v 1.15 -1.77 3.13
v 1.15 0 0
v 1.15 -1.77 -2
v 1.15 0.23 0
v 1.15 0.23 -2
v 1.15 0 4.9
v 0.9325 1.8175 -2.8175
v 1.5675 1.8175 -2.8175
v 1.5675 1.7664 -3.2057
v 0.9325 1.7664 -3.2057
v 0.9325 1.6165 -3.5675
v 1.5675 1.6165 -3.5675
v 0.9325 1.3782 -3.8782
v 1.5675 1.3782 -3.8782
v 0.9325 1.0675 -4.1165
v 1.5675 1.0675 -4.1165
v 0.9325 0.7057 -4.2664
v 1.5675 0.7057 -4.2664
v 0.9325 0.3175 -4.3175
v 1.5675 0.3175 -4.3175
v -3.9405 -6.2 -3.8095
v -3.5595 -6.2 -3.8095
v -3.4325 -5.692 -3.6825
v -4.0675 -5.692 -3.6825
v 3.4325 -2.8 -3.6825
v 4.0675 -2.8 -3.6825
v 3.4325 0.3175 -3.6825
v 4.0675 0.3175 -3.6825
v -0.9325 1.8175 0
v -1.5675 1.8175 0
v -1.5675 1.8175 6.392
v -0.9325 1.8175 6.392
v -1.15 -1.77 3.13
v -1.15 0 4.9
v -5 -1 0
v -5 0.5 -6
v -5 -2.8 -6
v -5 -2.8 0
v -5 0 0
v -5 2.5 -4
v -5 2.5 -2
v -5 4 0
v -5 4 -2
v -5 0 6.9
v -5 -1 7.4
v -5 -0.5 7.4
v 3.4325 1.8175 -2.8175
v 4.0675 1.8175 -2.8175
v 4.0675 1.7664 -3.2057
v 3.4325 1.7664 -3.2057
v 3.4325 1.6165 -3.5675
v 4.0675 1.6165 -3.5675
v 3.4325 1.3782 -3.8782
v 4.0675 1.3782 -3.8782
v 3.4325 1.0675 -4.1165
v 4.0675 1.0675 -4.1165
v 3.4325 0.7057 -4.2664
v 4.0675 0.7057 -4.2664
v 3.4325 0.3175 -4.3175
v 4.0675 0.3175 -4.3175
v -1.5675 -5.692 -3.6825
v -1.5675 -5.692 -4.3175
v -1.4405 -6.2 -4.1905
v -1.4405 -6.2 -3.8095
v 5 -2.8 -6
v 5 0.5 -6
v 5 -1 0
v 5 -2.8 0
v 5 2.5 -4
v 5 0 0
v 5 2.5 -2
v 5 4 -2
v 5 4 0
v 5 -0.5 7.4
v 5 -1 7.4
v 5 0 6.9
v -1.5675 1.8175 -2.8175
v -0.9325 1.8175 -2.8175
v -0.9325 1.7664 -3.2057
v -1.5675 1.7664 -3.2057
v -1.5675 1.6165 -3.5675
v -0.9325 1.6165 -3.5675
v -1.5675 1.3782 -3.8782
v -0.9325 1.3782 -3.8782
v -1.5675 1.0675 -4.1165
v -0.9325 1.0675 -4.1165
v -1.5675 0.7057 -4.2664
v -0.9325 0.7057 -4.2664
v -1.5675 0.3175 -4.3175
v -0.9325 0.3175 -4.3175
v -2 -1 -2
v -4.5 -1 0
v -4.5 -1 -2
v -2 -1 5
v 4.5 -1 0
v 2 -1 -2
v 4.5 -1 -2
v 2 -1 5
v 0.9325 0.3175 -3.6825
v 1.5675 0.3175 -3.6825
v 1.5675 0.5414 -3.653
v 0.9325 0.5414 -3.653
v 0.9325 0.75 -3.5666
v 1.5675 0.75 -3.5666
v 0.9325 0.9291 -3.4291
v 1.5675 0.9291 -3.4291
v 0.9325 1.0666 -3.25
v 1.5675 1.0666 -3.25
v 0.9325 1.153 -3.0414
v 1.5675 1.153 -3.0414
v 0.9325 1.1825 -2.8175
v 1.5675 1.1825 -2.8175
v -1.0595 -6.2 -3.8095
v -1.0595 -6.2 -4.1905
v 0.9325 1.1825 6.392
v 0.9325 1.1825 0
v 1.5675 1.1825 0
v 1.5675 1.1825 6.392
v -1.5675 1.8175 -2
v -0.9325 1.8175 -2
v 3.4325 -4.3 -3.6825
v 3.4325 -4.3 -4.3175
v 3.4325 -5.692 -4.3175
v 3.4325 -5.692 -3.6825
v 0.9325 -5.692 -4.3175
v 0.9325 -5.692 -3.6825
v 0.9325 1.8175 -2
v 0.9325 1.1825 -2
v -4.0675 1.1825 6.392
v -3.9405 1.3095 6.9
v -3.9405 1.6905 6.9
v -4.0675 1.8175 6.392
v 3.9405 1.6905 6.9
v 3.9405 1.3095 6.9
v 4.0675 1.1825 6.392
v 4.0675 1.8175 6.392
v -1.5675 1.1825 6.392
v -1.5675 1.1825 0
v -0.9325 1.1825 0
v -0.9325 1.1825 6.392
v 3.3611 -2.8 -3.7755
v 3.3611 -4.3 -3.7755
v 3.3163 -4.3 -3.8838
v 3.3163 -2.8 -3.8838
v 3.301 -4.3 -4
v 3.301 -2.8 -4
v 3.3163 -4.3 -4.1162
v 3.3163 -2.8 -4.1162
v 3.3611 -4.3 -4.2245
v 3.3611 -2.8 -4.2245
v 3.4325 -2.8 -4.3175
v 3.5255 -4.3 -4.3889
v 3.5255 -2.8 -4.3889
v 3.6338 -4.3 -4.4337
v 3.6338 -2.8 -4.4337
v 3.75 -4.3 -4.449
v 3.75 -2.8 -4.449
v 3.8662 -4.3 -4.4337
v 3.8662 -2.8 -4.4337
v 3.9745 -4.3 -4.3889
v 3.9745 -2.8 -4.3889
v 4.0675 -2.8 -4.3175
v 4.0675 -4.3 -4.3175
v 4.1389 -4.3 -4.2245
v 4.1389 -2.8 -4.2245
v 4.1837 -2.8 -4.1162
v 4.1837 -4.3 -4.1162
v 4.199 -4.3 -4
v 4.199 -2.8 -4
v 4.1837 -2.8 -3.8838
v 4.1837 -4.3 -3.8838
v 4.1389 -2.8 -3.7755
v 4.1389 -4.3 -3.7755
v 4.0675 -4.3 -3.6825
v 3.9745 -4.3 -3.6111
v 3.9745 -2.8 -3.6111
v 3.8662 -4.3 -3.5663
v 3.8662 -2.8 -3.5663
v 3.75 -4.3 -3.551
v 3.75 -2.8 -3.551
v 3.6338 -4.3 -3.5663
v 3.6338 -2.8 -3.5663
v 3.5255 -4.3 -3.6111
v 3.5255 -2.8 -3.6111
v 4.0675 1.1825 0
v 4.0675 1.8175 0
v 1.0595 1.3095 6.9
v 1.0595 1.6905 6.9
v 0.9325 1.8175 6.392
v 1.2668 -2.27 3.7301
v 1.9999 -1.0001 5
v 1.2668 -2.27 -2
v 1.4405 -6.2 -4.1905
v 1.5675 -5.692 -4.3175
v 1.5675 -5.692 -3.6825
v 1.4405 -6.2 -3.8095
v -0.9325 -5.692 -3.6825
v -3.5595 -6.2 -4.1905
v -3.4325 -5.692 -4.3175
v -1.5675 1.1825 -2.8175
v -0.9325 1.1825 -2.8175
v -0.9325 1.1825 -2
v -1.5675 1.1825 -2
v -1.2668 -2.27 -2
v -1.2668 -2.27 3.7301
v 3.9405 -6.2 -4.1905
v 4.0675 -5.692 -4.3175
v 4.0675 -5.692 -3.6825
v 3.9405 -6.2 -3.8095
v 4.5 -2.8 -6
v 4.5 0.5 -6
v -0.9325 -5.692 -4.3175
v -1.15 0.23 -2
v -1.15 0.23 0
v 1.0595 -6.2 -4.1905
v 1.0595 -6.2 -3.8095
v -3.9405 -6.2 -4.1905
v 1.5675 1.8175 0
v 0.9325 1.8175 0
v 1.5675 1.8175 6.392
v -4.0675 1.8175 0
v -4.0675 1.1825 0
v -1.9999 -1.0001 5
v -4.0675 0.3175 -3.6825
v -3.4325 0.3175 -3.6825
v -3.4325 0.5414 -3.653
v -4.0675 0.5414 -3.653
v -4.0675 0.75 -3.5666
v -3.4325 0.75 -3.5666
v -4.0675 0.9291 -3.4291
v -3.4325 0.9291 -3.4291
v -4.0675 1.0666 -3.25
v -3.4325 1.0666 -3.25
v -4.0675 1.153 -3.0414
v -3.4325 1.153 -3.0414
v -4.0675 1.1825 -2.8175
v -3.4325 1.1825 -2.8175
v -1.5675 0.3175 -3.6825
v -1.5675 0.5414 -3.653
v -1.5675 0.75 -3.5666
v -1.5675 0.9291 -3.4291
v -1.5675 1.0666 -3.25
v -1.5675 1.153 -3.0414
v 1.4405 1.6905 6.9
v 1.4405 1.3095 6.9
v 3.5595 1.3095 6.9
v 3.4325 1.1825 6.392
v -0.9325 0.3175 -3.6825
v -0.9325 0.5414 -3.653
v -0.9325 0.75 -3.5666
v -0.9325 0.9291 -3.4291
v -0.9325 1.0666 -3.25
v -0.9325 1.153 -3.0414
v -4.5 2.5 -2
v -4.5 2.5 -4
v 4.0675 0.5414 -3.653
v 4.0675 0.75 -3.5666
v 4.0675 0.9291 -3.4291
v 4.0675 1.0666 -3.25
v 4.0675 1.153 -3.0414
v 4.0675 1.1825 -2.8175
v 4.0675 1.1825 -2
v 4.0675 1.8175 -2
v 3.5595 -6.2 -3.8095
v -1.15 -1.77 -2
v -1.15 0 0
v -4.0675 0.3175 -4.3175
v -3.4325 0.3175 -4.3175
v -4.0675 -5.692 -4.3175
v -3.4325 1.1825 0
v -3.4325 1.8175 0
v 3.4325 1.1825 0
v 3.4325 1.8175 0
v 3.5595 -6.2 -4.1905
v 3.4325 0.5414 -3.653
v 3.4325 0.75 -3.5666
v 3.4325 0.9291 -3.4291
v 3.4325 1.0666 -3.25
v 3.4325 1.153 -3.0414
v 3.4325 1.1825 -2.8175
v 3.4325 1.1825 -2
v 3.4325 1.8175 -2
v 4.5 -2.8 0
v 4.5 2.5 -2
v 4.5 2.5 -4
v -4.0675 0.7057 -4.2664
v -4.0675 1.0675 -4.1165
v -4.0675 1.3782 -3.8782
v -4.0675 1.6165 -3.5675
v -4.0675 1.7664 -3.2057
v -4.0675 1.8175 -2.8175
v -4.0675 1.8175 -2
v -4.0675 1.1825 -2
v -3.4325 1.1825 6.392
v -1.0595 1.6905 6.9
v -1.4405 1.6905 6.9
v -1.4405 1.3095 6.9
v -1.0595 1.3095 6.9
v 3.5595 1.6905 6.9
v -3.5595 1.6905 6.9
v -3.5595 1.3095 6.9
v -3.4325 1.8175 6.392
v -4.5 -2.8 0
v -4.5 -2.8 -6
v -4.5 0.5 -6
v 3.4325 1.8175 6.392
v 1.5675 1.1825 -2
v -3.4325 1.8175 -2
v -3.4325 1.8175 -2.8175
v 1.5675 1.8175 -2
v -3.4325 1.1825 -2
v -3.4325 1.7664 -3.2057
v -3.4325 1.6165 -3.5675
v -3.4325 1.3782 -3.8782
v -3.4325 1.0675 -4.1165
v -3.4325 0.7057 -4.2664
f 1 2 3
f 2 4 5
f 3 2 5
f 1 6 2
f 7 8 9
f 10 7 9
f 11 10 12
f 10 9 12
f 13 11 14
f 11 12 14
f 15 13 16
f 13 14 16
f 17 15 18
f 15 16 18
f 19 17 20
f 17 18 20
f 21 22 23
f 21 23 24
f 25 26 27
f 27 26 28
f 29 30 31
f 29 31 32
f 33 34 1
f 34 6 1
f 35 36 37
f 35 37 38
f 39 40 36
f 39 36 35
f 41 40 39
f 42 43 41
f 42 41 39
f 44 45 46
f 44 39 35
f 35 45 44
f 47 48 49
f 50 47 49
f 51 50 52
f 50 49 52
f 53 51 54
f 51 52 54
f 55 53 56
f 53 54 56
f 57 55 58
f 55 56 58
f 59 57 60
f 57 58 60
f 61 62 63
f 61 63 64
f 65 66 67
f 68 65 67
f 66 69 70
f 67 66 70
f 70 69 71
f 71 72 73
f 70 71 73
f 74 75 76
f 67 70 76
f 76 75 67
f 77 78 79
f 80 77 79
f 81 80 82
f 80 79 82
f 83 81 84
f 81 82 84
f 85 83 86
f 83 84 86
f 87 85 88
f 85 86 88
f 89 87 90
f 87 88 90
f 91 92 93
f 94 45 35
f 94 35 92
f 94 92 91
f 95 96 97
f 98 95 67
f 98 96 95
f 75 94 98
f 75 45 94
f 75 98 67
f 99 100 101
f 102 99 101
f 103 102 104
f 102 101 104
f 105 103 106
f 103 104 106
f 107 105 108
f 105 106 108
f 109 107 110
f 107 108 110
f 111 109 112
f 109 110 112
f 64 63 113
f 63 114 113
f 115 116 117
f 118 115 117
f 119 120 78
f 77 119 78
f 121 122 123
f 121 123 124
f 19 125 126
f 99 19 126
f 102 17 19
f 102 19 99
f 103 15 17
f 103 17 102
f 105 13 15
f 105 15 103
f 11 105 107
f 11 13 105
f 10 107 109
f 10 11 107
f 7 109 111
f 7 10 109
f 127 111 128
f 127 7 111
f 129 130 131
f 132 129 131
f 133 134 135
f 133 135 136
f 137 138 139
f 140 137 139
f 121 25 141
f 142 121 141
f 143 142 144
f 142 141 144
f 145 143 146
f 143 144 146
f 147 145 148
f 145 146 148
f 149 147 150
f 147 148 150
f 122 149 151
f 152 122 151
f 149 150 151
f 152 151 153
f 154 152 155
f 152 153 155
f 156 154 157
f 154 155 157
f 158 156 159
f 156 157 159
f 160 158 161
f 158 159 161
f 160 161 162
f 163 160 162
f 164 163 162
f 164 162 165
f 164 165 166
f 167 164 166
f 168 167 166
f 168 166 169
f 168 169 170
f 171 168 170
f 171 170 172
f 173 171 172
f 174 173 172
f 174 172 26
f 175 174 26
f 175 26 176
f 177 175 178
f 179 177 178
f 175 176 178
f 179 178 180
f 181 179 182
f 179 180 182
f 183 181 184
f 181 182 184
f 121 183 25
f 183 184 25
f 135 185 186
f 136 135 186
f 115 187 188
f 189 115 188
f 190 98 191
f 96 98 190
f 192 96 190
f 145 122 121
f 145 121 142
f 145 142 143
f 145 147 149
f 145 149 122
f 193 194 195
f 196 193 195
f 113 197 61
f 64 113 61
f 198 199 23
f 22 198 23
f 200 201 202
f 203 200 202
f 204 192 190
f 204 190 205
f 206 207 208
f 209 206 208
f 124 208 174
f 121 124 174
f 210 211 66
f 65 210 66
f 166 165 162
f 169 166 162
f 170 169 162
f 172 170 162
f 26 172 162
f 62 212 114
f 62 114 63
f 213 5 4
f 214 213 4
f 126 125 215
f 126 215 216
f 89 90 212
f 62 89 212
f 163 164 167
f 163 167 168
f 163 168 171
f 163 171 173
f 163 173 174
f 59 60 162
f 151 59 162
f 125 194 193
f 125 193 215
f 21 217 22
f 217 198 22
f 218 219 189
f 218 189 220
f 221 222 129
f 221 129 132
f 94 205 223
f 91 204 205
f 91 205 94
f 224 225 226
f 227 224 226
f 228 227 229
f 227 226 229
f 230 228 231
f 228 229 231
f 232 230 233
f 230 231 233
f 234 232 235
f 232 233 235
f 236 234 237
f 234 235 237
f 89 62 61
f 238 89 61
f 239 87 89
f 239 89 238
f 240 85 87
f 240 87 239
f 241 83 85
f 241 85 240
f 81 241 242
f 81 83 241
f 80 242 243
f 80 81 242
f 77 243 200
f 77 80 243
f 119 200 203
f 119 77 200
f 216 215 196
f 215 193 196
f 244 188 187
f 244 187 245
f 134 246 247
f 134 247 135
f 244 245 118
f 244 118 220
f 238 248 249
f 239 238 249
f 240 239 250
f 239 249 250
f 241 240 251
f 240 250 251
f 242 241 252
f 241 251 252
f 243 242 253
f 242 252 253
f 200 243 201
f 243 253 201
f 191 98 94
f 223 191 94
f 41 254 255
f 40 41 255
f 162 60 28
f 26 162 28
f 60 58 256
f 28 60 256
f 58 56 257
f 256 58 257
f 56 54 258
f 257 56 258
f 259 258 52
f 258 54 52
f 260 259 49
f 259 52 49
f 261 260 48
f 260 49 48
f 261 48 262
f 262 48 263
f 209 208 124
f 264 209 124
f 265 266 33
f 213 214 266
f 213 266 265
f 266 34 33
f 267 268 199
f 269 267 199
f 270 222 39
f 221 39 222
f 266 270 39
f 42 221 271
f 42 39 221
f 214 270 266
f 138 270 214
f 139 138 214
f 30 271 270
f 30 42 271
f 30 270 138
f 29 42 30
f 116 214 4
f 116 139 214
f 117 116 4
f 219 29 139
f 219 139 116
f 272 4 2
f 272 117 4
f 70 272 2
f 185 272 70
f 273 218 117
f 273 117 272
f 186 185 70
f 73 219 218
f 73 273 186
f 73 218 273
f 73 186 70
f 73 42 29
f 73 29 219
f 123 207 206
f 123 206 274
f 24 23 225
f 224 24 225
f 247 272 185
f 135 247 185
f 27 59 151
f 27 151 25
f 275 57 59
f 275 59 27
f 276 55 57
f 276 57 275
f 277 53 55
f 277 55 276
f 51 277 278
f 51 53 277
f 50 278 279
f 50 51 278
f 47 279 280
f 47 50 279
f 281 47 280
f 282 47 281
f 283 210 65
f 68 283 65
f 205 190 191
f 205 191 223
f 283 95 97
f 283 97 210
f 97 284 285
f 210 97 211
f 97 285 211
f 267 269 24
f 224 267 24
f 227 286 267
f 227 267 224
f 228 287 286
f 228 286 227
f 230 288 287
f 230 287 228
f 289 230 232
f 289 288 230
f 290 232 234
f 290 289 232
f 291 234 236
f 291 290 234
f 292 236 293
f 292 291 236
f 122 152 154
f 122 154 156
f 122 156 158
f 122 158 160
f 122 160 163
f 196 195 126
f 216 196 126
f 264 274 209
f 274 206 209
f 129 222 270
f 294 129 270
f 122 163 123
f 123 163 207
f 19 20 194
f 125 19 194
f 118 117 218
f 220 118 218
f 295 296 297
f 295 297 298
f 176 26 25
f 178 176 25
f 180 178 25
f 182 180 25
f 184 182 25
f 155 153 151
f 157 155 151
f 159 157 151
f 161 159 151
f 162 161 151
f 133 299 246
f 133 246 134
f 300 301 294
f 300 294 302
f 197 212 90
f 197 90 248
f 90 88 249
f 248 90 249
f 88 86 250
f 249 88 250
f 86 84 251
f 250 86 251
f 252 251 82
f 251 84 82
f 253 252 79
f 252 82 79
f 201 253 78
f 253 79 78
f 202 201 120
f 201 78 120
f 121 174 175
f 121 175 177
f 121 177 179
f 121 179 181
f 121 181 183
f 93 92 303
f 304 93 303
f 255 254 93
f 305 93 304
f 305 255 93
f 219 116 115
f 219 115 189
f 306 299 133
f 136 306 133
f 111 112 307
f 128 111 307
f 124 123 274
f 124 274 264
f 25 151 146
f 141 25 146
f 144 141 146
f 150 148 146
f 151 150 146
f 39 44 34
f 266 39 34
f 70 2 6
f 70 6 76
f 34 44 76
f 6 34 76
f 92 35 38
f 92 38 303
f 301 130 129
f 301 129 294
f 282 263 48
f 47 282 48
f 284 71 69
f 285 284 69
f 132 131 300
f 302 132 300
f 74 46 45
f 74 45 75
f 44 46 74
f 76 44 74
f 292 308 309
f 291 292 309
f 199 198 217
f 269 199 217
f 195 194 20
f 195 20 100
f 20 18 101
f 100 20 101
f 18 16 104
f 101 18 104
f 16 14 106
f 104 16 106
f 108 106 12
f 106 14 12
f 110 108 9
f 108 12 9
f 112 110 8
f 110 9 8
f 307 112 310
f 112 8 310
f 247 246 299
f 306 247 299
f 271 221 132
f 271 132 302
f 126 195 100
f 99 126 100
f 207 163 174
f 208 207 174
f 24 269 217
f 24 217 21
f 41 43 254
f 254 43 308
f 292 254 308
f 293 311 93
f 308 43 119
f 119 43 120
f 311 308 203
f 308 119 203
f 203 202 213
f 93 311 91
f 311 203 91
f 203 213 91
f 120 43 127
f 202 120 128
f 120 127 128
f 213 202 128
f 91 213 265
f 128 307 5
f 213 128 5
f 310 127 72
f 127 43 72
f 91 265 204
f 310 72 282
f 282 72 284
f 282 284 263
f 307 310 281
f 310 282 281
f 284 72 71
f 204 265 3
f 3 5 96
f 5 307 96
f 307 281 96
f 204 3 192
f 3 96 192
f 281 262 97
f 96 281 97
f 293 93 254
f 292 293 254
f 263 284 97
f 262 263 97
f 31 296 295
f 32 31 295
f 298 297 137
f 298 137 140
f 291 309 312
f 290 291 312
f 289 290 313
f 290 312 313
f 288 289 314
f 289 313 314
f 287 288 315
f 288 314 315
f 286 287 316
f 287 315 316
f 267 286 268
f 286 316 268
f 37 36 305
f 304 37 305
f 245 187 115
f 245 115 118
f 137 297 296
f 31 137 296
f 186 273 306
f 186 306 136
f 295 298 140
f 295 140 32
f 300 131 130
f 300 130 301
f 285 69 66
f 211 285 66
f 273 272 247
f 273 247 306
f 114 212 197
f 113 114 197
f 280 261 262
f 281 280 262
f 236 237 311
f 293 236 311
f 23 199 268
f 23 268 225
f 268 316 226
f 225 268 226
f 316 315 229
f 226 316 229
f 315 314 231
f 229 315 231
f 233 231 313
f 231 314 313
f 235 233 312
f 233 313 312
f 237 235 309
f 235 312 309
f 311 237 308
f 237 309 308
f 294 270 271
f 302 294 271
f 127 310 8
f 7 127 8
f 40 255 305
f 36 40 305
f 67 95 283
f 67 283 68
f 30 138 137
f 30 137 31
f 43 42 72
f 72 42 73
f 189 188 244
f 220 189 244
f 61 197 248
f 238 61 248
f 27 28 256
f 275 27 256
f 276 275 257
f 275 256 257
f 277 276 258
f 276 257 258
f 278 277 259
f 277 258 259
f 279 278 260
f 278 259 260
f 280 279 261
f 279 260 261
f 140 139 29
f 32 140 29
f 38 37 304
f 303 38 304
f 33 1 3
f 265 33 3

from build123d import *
from OCP.BRepFilletAPI import BRepFilletAPI_MakeChamfer

# Parameters (mm, degrees)
SKETCH1_W                             = 10
SKETCH1_H                             = 4
BODY_BASE_DEPTH                       = 2
SKETCH2_W                             = 0.635
SKETCH2_H                             = 0.635
HORIZONTAL_PINS_DEPTH                 = 6.9
SKETCH3_W                             = 10
SKETCH3_H                             = 9.4
BODY_HORIZONTAL_SHELF_DEPTH           = 1
MATING_CONNECTOR_LEAD_IN_CHAMFER_SIZE = 0.5
SKETCH4_W                             = 0.5
SKETCH4_H                             = 6
BODY_SIDEWALLS_DEPTH                  = 6.8
BODY_SIDEWALL_MATERIA_REMOVALL_DEPTH  = 7.21
LOCKING_TROUGH_EXTERIOR_DEPTH         = 7
LOCKING_TROUGH_CHAMFER_EXTERIOR_SIZE  = 1.27
LOCKING_TROUGH_MATERIAL_REMOVAL_DEPTH = 1.15
REMAINDER_OF_PIN_DEPTH                = 0.635
LPATTERN_COMPLEMENT_OF_PINS_COUNT     = 4
LPATTERN_COMPLEMENT_OF_PINS_PITCH     = 2.5
PIN_CHAMFER1_SIZE                     = 0.508
PIN_CHAMFER1_SIZE2                    = 0.127
PIN_CHAMFER2_SIZE                     = 0.127
PIN_CHAMFER2_SIZE2                    = 0.508
SKETCH11_R                            = 0.449012806
PIN_1_MARKING_AND_MATE_AIDE_DEPTH     = 1.5


with BuildPart() as part:
    # Sketch1 → Body base (new body)
    with BuildSketch(Plane.XY):
        with Locations((0, 2)):
            Rectangle(SKETCH1_W, SKETCH1_H)
    extrude(amount=-BODY_BASE_DEPTH)

    # Sketch2 → Horizontal pins (add)
    with BuildSketch(Plane.XY):
        with Locations((-3.75, 1.5)):
            Rectangle(SKETCH2_W, SKETCH2_H)
        with Locations((-1.25, 1.5)):
            Rectangle(SKETCH2_W, SKETCH2_H)
        with Locations((1.25, 1.5)):
            Rectangle(SKETCH2_W, SKETCH2_H)
        with Locations((3.75, 1.5)):
            Rectangle(SKETCH2_W, SKETCH2_H)
    extrude(amount=HORIZONTAL_PINS_DEPTH)

    # Sketch3 → Body - horizontal shelf (add)
    with BuildSketch(Plane.XZ):
        with Locations((0, 2.7)):
            Rectangle(SKETCH3_W, SKETCH3_H)
    extrude(amount=BODY_HORIZONTAL_SHELF_DEPTH)

    # Mating connector lead-in chamfer
    mating_connector_lead_in_chamfer_edges = [part.edges().sort_by_distance(p)[0] for p in [
        (0, 0, 7.4),
    ]]
    chamfer(mating_connector_lead_in_chamfer_edges, length=MATING_CONNECTOR_LEAD_IN_CHAMFER_SIZE)

    # Sketch4 → Body sidewalls (add)
    with BuildSketch(Plane(origin=(0, 4, 0), x_dir=(1, 0, 0), z_dir=(0, 1, 0))):
        with Locations((-4.75, 3)):
            Rectangle(SKETCH4_W, SKETCH4_H)
        with Locations((4.75, 3)):
            Rectangle(SKETCH4_W, SKETCH4_H)
    extrude(amount=-BODY_SIDEWALLS_DEPTH)

    # Sketch5 → Body sidewall - materia removall (cut, symmetric)
    with BuildSketch(Plane(origin=(0, 0, 0), x_dir=(0, 0, -1), z_dir=(1, 0, 0))):
        Polygon((2, 4), (2, 2.5), (4, 2.5), (6, 0.5), (6, 4), align=None)
    extrude(amount=BODY_SIDEWALL_MATERIA_REMOVALL_DEPTH, both=True, mode=Mode.SUBTRACT)

    # Sketch6 → Locking trough - exterior (add)
    with BuildSketch(Plane(origin=(0, 0, -2), x_dir=(-1, 0, 0), z_dir=(0, 0, -1))):
        Polygon((-2, -1), (-1.266765158, -2.27), (1.266765158, -2.27), (2, -1), align=None)
    extrude(amount=-LOCKING_TROUGH_EXTERIOR_DEPTH)

    # Locking trough chamfer - exterior
    locking_trough_chamfer_exterior_edges = [part.edges().sort_by_distance(p)[0] for p in [
        (0, -2.27, 5),
    ]]
    chamfer(locking_trough_chamfer_exterior_edges, length=LOCKING_TROUGH_CHAMFER_EXTERIOR_SIZE - 0.0001)  # a hair under: the kernel refuses the full size

    # Sketch8 → Locking trough - material removal (cut, symmetric)
    with BuildSketch(Plane(origin=(0, 0, 0), x_dir=(0, 0, -1), z_dir=(1, 0, 0))):
        Polygon((-4.9, 0), (-3.13, -1.77), (6, -1.77), (6, 0.23), (0, 0.23), (0, 0), align=None)
    extrude(amount=LOCKING_TROUGH_MATERIAL_REMOVAL_DEPTH, both=True, mode=Mode.SUBTRACT)

    # Sketch9 → Remainder of pin (add)
    with BuildSketch(Plane(origin=(4.0675, 0, 0), x_dir=(0, 0, -1), z_dir=(1, 0, 0))):
        with BuildLine():
            Line((2, 1.8175), (2.8175, 1.8175))
            ThreePointArc((2.8175, 1.8175), (3.878160172, 1.378160172), (4.3175, 0.3175))
            Line((4.3175, 0.3175), (4.3175, -6.2))
            Line((4.3175, -6.2), (3.6825, -6.2))
            Line((3.6825, -6.2), (3.6825, 0.3175))
            ThreePointArc((3.6825, 0.3175), (3.429147366, 0.929147366), (2.8175, 1.1825))
            Line((2.8175, 1.1825), (2, 1.1825))
            Line((2, 1.1825), (2, 1.8175))
        make_face()
    remainder_of_pin = extrude(amount=-REMAINDER_OF_PIN_DEPTH)

    # LPattern - complement  of pins: Remainder of pin ×4
    with Locations(*[(-i * LPATTERN_COMPLEMENT_OF_PINS_PITCH, 0, 0) for i in range(1, LPATTERN_COMPLEMENT_OF_PINS_COUNT)]):
        add(remainder_of_pin)

    # Pin chamfer1: one chamfer whose edges measure the first distance from different faces: ONE call of the kernel's chamfer builder (chamfer() names one face for all edges)
    pin_chamfer1_edges_1 = [part.edges().sort_by_distance(p)[0] for p in [
        (-4.0675, 1.5, 6.9),
    ]]
    pin_chamfer1_side_1 = [part.faces().sort_by_distance(p)[0] for p in [
        (-4.0675, 1.5, 3.45),
    ]]
    pin_chamfer1_edges_2 = [part.edges().sort_by_distance(p)[0] for p in [
        (-3.75, 1.1825, 6.9),
    ]]
    pin_chamfer1_side_2 = [part.faces().sort_by_distance(p)[0] for p in [
        (-3.75, 1.1825, 3.45),
    ]]
    pin_chamfer1_edges_3 = [part.edges().sort_by_distance(p)[0] for p in [
        (-3.4325, 1.5, 6.9),
    ]]
    pin_chamfer1_side_3 = [part.faces().sort_by_distance(p)[0] for p in [
        (-3.4325, 1.5, 3.45),
    ]]
    pin_chamfer1_edges_4 = [part.edges().sort_by_distance(p)[0] for p in [
        (-3.75, 1.8175, 6.9),
    ]]
    pin_chamfer1_side_4 = [part.faces().sort_by_distance(p)[0] for p in [
        (-3.75, 1.8175, 3.45),
    ]]
    pin_chamfer1_edges_5 = [part.edges().sort_by_distance(p)[0] for p in [
        (-1.5675, 1.5, 6.9),
    ]]
    pin_chamfer1_side_5 = [part.faces().sort_by_distance(p)[0] for p in [
        (-1.5675, 1.5, 3.45),
    ]]
    pin_chamfer1_edges_6 = [part.edges().sort_by_distance(p)[0] for p in [
        (-1.25, 1.1825, 6.9),
    ]]
    pin_chamfer1_side_6 = [part.faces().sort_by_distance(p)[0] for p in [
        (-1.25, 1.1825, 3.45),
    ]]
    pin_chamfer1_edges_7 = [part.edges().sort_by_distance(p)[0] for p in [
        (-0.9325, 1.5, 6.9),
    ]]
    pin_chamfer1_side_7 = [part.faces().sort_by_distance(p)[0] for p in [
        (-0.9325, 1.5, 3.45),
    ]]
    pin_chamfer1_edges_8 = [part.edges().sort_by_distance(p)[0] for p in [
        (-1.25, 1.8175, 6.9),
    ]]
    pin_chamfer1_side_8 = [part.faces().sort_by_distance(p)[0] for p in [
        (-1.25, 1.8175, 3.45),
    ]]
    pin_chamfer1_edges_9 = [part.edges().sort_by_distance(p)[0] for p in [
        (0.9325, 1.5, 6.9),
    ]]
    pin_chamfer1_side_9 = [part.faces().sort_by_distance(p)[0] for p in [
        (0.9325, 1.5, 3.45),
    ]]
    pin_chamfer1_edges_10 = [part.edges().sort_by_distance(p)[0] for p in [
        (1.25, 1.1825, 6.9),
    ]]
    pin_chamfer1_side_10 = [part.faces().sort_by_distance(p)[0] for p in [
        (1.25, 1.1825, 3.45),
    ]]
    pin_chamfer1_edges_11 = [part.edges().sort_by_distance(p)[0] for p in [
        (1.5675, 1.5, 6.9),
    ]]
    pin_chamfer1_side_11 = [part.faces().sort_by_distance(p)[0] for p in [
        (1.5675, 1.5, 3.45),
    ]]
    pin_chamfer1_edges_12 = [part.edges().sort_by_distance(p)[0] for p in [
        (1.25, 1.8175, 6.9),
    ]]
    pin_chamfer1_side_12 = [part.faces().sort_by_distance(p)[0] for p in [
        (1.25, 1.8175, 3.45),
    ]]
    pin_chamfer1_edges_13 = [part.edges().sort_by_distance(p)[0] for p in [
        (3.4325, 1.5, 6.9),
    ]]
    pin_chamfer1_side_13 = [part.faces().sort_by_distance(p)[0] for p in [
        (3.4325, 1.5, 3.45),
    ]]
    pin_chamfer1_edges_14 = [part.edges().sort_by_distance(p)[0] for p in [
        (3.75, 1.1825, 6.9),
    ]]
    pin_chamfer1_side_14 = [part.faces().sort_by_distance(p)[0] for p in [
        (3.75, 1.1825, 3.45),
    ]]
    pin_chamfer1_edges_15 = [part.edges().sort_by_distance(p)[0] for p in [
        (4.0675, 1.5, 6.9),
    ]]
    pin_chamfer1_side_15 = [part.faces().sort_by_distance(p)[0] for p in [
        (4.0675, 1.5, 3.45),
    ]]
    pin_chamfer1_edges_16 = [part.edges().sort_by_distance(p)[0] for p in [
        (3.75, 1.8175, 6.9),
    ]]
    pin_chamfer1_side_16 = [part.faces().sort_by_distance(p)[0] for p in [
        (3.75, 1.8175, 3.45),
    ]]
    pin_chamfer1 = BRepFilletAPI_MakeChamfer(part.part.solid().wrapped)
    for e in pin_chamfer1_edges_1:
        pin_chamfer1.Add(PIN_CHAMFER1_SIZE, PIN_CHAMFER1_SIZE2, e.wrapped, pin_chamfer1_side_1[0].wrapped)  # the first distance lies on this face
    for e in pin_chamfer1_edges_2:
        pin_chamfer1.Add(PIN_CHAMFER1_SIZE, PIN_CHAMFER1_SIZE2, e.wrapped, pin_chamfer1_side_2[0].wrapped)  # the first distance lies on this face
    for e in pin_chamfer1_edges_3:
        pin_chamfer1.Add(PIN_CHAMFER1_SIZE, PIN_CHAMFER1_SIZE2, e.wrapped, pin_chamfer1_side_3[0].wrapped)  # the first distance lies on this face
    for e in pin_chamfer1_edges_4:
        pin_chamfer1.Add(PIN_CHAMFER1_SIZE, PIN_CHAMFER1_SIZE2, e.wrapped, pin_chamfer1_side_4[0].wrapped)  # the first distance lies on this face
    for e in pin_chamfer1_edges_5:
        pin_chamfer1.Add(PIN_CHAMFER1_SIZE, PIN_CHAMFER1_SIZE2, e.wrapped, pin_chamfer1_side_5[0].wrapped)  # the first distance lies on this face
    for e in pin_chamfer1_edges_6:
        pin_chamfer1.Add(PIN_CHAMFER1_SIZE, PIN_CHAMFER1_SIZE2, e.wrapped, pin_chamfer1_side_6[0].wrapped)  # the first distance lies on this face
    for e in pin_chamfer1_edges_7:
        pin_chamfer1.Add(PIN_CHAMFER1_SIZE, PIN_CHAMFER1_SIZE2, e.wrapped, pin_chamfer1_side_7[0].wrapped)  # the first distance lies on this face
    for e in pin_chamfer1_edges_8:
        pin_chamfer1.Add(PIN_CHAMFER1_SIZE, PIN_CHAMFER1_SIZE2, e.wrapped, pin_chamfer1_side_8[0].wrapped)  # the first distance lies on this face
    for e in pin_chamfer1_edges_9:
        pin_chamfer1.Add(PIN_CHAMFER1_SIZE, PIN_CHAMFER1_SIZE2, e.wrapped, pin_chamfer1_side_9[0].wrapped)  # the first distance lies on this face
    for e in pin_chamfer1_edges_10:
        pin_chamfer1.Add(PIN_CHAMFER1_SIZE, PIN_CHAMFER1_SIZE2, e.wrapped, pin_chamfer1_side_10[0].wrapped)  # the first distance lies on this face
    for e in pin_chamfer1_edges_11:
        pin_chamfer1.Add(PIN_CHAMFER1_SIZE, PIN_CHAMFER1_SIZE2, e.wrapped, pin_chamfer1_side_11[0].wrapped)  # the first distance lies on this face
    for e in pin_chamfer1_edges_12:
        pin_chamfer1.Add(PIN_CHAMFER1_SIZE, PIN_CHAMFER1_SIZE2, e.wrapped, pin_chamfer1_side_12[0].wrapped)  # the first distance lies on this face
    for e in pin_chamfer1_edges_13:
        pin_chamfer1.Add(PIN_CHAMFER1_SIZE, PIN_CHAMFER1_SIZE2, e.wrapped, pin_chamfer1_side_13[0].wrapped)  # the first distance lies on this face
    for e in pin_chamfer1_edges_14:
        pin_chamfer1.Add(PIN_CHAMFER1_SIZE, PIN_CHAMFER1_SIZE2, e.wrapped, pin_chamfer1_side_14[0].wrapped)  # the first distance lies on this face
    for e in pin_chamfer1_edges_15:
        pin_chamfer1.Add(PIN_CHAMFER1_SIZE, PIN_CHAMFER1_SIZE2, e.wrapped, pin_chamfer1_side_15[0].wrapped)  # the first distance lies on this face
    for e in pin_chamfer1_edges_16:
        pin_chamfer1.Add(PIN_CHAMFER1_SIZE, PIN_CHAMFER1_SIZE2, e.wrapped, pin_chamfer1_side_16[0].wrapped)  # the first distance lies on this face
    add(Compound.cast(pin_chamfer1.Shape()), mode=Mode.REPLACE)

    # Pin chamfer2: one chamfer whose edges measure the first distance from different faces: ONE call of the kernel's chamfer builder (chamfer() names one face for all edges)
    pin_chamfer2_edges_1 = [part.edges().sort_by_distance(p)[0] for p in [
        (3.4325, -6.2, -4),
        (3.75, -6.2, -4.3175),
        (3.75, -6.2, -3.6825),
        (4.0675, -6.2, -4),
    ]]
    pin_chamfer2_side_1 = [part.faces().sort_by_distance(p)[0] for p in [
        (3.75, -6.2, -4),
    ]]
    pin_chamfer2_edges_2 = [part.edges().sort_by_distance(p)[0] for p in [
        (0.9325, -6.2, -4),
        (1.25, -6.2, -4.3175),
        (1.25, -6.2, -3.6825),
        (1.5675, -6.2, -4),
    ]]
    pin_chamfer2_side_2 = [part.faces().sort_by_distance(p)[0] for p in [
        (1.25, -6.2, -4),
    ]]
    pin_chamfer2_edges_3 = [part.edges().sort_by_distance(p)[0] for p in [
        (-1.5675, -6.2, -4),
        (-1.25, -6.2, -4.3175),
        (-1.25, -6.2, -3.6825),
        (-0.9325, -6.2, -4),
    ]]
    pin_chamfer2_side_3 = [part.faces().sort_by_distance(p)[0] for p in [
        (-1.25, -6.2, -4),
    ]]
    pin_chamfer2_edges_4 = [part.edges().sort_by_distance(p)[0] for p in [
        (-4.0675, -6.2, -4),
        (-3.75, -6.2, -4.3175),
        (-3.75, -6.2, -3.6825),
        (-3.4325, -6.2, -4),
    ]]
    pin_chamfer2_side_4 = [part.faces().sort_by_distance(p)[0] for p in [
        (-3.75, -6.2, -4),
    ]]
    pin_chamfer2 = BRepFilletAPI_MakeChamfer(part.part.solid().wrapped)
    for e in pin_chamfer2_edges_1:
        pin_chamfer2.Add(PIN_CHAMFER2_SIZE, PIN_CHAMFER2_SIZE2, e.wrapped, pin_chamfer2_side_1[0].wrapped)  # the first distance lies on this face
    for e in pin_chamfer2_edges_2:
        pin_chamfer2.Add(PIN_CHAMFER2_SIZE, PIN_CHAMFER2_SIZE2, e.wrapped, pin_chamfer2_side_2[0].wrapped)  # the first distance lies on this face
    for e in pin_chamfer2_edges_3:
        pin_chamfer2.Add(PIN_CHAMFER2_SIZE, PIN_CHAMFER2_SIZE2, e.wrapped, pin_chamfer2_side_3[0].wrapped)  # the first distance lies on this face
    for e in pin_chamfer2_edges_4:
        pin_chamfer2.Add(PIN_CHAMFER2_SIZE, PIN_CHAMFER2_SIZE2, e.wrapped, pin_chamfer2_side_4[0].wrapped)  # the first distance lies on this face
    add(Compound.cast(pin_chamfer2.Shape()), mode=Mode.REPLACE)

    # Sketch11 → Pin 1 marking and mate aide (add)
    with BuildSketch(Plane.XZ.offset(2.8)):
        with Locations(Location((3.75, -4, 0), (0, 0, 135))):
            Circle(SKETCH11_R)
    extrude(amount=PIN_1_MARKING_AND_MATE_AIDE_DEPTH)


solid = part.part
